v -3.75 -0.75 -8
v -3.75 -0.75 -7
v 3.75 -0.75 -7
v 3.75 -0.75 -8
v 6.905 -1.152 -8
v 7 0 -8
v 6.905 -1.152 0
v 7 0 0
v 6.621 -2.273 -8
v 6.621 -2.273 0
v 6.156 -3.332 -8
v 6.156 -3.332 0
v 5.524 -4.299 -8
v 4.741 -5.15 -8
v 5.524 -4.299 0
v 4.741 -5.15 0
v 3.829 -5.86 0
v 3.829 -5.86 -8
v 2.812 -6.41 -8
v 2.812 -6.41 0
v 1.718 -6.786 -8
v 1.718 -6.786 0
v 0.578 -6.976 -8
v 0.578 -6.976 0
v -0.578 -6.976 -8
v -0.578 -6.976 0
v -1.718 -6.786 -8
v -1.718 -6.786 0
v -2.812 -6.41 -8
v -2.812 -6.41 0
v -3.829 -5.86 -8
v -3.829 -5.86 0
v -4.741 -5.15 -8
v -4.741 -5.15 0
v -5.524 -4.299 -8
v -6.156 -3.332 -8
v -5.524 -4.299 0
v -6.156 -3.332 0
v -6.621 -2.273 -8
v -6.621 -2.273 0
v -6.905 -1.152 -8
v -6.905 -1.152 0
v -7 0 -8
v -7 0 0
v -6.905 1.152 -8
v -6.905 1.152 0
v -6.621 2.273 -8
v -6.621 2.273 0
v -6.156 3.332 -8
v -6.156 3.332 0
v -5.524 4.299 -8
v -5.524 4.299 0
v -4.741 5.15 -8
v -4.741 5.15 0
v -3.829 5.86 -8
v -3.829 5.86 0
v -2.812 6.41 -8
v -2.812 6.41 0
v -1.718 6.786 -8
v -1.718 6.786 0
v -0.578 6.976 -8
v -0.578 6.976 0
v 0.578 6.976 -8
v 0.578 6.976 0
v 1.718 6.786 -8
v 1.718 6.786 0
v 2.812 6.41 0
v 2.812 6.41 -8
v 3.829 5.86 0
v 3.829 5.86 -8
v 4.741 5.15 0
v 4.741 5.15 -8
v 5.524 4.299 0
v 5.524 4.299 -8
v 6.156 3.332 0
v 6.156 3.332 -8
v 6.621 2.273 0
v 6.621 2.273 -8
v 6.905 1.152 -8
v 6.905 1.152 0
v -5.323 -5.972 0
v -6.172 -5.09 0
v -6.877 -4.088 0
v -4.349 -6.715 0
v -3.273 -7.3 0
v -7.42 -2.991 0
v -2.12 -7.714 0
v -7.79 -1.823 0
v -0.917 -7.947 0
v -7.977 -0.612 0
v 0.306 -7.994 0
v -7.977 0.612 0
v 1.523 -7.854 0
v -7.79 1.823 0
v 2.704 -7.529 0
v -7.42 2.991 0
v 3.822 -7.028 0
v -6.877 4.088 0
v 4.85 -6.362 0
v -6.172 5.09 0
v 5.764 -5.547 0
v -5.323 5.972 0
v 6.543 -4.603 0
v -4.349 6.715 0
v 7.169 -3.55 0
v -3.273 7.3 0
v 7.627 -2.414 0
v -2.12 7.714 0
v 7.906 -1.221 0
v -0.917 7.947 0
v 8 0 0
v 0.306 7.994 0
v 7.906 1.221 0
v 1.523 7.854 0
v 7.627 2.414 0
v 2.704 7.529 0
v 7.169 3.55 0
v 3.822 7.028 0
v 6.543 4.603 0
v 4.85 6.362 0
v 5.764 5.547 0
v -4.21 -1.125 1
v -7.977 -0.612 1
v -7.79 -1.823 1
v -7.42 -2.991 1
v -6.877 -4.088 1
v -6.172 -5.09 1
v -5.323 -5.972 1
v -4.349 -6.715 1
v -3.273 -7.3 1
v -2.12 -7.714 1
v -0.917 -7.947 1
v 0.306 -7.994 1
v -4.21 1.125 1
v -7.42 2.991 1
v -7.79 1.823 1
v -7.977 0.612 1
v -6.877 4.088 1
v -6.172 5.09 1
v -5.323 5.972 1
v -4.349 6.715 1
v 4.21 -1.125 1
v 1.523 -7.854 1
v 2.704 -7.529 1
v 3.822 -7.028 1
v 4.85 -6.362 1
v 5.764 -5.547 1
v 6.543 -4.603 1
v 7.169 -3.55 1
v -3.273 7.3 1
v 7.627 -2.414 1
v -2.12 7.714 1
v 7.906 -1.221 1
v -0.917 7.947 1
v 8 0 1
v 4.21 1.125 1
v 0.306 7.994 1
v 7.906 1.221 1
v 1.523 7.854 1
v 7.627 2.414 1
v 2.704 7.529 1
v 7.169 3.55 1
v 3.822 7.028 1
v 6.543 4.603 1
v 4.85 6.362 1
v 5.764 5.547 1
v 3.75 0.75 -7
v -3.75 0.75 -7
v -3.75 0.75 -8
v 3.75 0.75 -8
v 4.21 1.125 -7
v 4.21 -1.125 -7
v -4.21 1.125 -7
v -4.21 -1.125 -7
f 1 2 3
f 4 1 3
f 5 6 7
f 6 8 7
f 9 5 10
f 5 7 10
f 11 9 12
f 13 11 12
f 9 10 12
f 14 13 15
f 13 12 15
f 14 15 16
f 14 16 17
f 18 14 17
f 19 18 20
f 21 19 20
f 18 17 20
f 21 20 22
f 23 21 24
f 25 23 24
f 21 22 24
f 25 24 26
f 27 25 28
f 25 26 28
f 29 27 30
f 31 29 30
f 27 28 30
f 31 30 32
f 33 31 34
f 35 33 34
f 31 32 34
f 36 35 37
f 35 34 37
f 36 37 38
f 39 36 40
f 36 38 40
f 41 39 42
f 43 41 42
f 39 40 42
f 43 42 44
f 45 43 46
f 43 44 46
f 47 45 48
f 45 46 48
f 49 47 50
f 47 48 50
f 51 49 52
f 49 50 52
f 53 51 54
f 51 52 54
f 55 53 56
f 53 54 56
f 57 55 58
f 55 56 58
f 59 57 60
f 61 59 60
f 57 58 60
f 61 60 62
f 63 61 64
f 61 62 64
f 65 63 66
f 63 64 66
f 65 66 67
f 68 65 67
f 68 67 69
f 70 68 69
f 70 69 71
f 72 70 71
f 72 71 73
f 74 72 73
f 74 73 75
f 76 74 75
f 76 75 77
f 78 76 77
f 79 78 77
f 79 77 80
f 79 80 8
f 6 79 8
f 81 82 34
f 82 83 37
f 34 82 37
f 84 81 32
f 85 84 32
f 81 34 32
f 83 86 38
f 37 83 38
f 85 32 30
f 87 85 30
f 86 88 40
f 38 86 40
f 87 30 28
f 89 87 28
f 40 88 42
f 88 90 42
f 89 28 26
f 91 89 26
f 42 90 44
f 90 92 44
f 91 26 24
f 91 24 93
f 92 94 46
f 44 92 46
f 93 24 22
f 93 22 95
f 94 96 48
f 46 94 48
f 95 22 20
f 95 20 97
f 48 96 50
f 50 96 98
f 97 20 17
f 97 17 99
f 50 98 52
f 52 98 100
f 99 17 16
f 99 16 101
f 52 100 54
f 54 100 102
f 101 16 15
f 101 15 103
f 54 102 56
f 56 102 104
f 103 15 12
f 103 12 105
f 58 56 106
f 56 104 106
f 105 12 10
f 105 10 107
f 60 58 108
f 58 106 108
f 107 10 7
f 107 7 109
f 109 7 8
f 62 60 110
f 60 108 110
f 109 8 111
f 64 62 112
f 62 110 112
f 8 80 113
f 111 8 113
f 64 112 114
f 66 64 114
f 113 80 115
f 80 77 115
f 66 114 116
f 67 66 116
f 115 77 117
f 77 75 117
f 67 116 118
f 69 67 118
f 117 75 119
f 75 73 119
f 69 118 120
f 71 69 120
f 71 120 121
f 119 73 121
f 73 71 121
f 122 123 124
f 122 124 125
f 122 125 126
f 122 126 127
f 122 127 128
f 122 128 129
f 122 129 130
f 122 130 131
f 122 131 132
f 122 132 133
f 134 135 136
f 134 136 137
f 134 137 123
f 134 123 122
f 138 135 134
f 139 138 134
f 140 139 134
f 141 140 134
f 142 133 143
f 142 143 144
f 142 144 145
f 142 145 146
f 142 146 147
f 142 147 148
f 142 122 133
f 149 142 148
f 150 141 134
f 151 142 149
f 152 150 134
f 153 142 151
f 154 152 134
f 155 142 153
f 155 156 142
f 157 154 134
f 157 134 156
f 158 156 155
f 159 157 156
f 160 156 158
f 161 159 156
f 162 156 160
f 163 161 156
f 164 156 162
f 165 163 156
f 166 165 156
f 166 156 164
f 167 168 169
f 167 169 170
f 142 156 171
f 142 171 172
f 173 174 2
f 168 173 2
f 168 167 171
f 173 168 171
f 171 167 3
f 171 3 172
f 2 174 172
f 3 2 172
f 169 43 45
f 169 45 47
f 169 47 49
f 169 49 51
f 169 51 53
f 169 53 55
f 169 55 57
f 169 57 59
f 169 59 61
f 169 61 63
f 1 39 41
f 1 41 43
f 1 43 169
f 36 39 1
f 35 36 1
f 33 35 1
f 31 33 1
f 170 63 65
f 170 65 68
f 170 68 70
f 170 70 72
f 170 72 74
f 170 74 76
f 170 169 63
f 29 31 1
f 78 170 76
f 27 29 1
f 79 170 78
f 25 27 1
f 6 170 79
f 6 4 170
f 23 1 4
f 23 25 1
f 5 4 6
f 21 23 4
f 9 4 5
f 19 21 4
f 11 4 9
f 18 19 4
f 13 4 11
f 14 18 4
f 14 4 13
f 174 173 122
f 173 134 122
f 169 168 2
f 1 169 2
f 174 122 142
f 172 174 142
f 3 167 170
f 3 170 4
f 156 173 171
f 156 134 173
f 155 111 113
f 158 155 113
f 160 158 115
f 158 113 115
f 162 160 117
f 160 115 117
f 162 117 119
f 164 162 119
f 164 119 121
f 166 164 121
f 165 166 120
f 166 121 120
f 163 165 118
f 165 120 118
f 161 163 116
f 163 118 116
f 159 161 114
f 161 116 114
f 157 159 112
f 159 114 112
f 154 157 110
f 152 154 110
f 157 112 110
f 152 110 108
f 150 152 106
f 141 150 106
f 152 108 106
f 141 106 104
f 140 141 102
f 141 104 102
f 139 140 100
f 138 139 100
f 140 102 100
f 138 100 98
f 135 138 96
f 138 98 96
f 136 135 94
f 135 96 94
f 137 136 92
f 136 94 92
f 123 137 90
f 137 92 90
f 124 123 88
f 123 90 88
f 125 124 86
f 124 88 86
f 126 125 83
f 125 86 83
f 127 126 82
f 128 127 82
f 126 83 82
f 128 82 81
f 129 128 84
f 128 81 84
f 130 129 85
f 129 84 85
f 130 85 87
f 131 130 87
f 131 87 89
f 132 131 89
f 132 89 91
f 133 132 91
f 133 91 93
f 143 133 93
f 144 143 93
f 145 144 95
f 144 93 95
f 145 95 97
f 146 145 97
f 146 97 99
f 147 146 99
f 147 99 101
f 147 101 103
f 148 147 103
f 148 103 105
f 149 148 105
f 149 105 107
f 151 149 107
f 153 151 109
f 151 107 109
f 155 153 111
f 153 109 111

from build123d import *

# Parameters (mm, degrees)
SKETCH_R     = 8
SKETCH_W     = 8.42
SKETCH_H     = 2.25
PAD_DEPTH    = 1
SKETCH001_R  = 7
SKETCH001_W  = 8.42
SKETCH001_H  = 2.25
PAD001_DEPTH = 7
SKETCH002_R  = 7
SKETCH002_W  = 7.5
SKETCH002_H  = 1.5
PAD002_DEPTH = 1


with BuildPart() as part:
    # Sketch → Pad (new body)
    with BuildSketch(Plane.XY):
        Circle(SKETCH_R)
        Rectangle(SKETCH_W, SKETCH_H, mode=Mode.SUBTRACT)
    extrude(amount=PAD_DEPTH)

    # Sketch001 (on Face6 of Pad) → Pad001 (join)
    with BuildSketch(Plane(origin=(0, 0, 0), x_dir=(1, 0, 0), z_dir=(0, 0, -1))):
        Circle(SKETCH001_R)
        Rectangle(SKETCH001_W, SKETCH001_H, mode=Mode.SUBTRACT)
    extrude(amount=PAD001_DEPTH)

    # Sketch002 (on Face9 of Pad001) → Pad002 (join)
    with BuildSketch(Plane(origin=(0, 0, -7), x_dir=(1, 0, 0), z_dir=(0, 0, -1))):
        Circle(SKETCH002_R)
        Rectangle(SKETCH002_W, SKETCH002_H, mode=Mode.SUBTRACT)
    extrude(amount=PAD002_DEPTH)


solid = part.part
